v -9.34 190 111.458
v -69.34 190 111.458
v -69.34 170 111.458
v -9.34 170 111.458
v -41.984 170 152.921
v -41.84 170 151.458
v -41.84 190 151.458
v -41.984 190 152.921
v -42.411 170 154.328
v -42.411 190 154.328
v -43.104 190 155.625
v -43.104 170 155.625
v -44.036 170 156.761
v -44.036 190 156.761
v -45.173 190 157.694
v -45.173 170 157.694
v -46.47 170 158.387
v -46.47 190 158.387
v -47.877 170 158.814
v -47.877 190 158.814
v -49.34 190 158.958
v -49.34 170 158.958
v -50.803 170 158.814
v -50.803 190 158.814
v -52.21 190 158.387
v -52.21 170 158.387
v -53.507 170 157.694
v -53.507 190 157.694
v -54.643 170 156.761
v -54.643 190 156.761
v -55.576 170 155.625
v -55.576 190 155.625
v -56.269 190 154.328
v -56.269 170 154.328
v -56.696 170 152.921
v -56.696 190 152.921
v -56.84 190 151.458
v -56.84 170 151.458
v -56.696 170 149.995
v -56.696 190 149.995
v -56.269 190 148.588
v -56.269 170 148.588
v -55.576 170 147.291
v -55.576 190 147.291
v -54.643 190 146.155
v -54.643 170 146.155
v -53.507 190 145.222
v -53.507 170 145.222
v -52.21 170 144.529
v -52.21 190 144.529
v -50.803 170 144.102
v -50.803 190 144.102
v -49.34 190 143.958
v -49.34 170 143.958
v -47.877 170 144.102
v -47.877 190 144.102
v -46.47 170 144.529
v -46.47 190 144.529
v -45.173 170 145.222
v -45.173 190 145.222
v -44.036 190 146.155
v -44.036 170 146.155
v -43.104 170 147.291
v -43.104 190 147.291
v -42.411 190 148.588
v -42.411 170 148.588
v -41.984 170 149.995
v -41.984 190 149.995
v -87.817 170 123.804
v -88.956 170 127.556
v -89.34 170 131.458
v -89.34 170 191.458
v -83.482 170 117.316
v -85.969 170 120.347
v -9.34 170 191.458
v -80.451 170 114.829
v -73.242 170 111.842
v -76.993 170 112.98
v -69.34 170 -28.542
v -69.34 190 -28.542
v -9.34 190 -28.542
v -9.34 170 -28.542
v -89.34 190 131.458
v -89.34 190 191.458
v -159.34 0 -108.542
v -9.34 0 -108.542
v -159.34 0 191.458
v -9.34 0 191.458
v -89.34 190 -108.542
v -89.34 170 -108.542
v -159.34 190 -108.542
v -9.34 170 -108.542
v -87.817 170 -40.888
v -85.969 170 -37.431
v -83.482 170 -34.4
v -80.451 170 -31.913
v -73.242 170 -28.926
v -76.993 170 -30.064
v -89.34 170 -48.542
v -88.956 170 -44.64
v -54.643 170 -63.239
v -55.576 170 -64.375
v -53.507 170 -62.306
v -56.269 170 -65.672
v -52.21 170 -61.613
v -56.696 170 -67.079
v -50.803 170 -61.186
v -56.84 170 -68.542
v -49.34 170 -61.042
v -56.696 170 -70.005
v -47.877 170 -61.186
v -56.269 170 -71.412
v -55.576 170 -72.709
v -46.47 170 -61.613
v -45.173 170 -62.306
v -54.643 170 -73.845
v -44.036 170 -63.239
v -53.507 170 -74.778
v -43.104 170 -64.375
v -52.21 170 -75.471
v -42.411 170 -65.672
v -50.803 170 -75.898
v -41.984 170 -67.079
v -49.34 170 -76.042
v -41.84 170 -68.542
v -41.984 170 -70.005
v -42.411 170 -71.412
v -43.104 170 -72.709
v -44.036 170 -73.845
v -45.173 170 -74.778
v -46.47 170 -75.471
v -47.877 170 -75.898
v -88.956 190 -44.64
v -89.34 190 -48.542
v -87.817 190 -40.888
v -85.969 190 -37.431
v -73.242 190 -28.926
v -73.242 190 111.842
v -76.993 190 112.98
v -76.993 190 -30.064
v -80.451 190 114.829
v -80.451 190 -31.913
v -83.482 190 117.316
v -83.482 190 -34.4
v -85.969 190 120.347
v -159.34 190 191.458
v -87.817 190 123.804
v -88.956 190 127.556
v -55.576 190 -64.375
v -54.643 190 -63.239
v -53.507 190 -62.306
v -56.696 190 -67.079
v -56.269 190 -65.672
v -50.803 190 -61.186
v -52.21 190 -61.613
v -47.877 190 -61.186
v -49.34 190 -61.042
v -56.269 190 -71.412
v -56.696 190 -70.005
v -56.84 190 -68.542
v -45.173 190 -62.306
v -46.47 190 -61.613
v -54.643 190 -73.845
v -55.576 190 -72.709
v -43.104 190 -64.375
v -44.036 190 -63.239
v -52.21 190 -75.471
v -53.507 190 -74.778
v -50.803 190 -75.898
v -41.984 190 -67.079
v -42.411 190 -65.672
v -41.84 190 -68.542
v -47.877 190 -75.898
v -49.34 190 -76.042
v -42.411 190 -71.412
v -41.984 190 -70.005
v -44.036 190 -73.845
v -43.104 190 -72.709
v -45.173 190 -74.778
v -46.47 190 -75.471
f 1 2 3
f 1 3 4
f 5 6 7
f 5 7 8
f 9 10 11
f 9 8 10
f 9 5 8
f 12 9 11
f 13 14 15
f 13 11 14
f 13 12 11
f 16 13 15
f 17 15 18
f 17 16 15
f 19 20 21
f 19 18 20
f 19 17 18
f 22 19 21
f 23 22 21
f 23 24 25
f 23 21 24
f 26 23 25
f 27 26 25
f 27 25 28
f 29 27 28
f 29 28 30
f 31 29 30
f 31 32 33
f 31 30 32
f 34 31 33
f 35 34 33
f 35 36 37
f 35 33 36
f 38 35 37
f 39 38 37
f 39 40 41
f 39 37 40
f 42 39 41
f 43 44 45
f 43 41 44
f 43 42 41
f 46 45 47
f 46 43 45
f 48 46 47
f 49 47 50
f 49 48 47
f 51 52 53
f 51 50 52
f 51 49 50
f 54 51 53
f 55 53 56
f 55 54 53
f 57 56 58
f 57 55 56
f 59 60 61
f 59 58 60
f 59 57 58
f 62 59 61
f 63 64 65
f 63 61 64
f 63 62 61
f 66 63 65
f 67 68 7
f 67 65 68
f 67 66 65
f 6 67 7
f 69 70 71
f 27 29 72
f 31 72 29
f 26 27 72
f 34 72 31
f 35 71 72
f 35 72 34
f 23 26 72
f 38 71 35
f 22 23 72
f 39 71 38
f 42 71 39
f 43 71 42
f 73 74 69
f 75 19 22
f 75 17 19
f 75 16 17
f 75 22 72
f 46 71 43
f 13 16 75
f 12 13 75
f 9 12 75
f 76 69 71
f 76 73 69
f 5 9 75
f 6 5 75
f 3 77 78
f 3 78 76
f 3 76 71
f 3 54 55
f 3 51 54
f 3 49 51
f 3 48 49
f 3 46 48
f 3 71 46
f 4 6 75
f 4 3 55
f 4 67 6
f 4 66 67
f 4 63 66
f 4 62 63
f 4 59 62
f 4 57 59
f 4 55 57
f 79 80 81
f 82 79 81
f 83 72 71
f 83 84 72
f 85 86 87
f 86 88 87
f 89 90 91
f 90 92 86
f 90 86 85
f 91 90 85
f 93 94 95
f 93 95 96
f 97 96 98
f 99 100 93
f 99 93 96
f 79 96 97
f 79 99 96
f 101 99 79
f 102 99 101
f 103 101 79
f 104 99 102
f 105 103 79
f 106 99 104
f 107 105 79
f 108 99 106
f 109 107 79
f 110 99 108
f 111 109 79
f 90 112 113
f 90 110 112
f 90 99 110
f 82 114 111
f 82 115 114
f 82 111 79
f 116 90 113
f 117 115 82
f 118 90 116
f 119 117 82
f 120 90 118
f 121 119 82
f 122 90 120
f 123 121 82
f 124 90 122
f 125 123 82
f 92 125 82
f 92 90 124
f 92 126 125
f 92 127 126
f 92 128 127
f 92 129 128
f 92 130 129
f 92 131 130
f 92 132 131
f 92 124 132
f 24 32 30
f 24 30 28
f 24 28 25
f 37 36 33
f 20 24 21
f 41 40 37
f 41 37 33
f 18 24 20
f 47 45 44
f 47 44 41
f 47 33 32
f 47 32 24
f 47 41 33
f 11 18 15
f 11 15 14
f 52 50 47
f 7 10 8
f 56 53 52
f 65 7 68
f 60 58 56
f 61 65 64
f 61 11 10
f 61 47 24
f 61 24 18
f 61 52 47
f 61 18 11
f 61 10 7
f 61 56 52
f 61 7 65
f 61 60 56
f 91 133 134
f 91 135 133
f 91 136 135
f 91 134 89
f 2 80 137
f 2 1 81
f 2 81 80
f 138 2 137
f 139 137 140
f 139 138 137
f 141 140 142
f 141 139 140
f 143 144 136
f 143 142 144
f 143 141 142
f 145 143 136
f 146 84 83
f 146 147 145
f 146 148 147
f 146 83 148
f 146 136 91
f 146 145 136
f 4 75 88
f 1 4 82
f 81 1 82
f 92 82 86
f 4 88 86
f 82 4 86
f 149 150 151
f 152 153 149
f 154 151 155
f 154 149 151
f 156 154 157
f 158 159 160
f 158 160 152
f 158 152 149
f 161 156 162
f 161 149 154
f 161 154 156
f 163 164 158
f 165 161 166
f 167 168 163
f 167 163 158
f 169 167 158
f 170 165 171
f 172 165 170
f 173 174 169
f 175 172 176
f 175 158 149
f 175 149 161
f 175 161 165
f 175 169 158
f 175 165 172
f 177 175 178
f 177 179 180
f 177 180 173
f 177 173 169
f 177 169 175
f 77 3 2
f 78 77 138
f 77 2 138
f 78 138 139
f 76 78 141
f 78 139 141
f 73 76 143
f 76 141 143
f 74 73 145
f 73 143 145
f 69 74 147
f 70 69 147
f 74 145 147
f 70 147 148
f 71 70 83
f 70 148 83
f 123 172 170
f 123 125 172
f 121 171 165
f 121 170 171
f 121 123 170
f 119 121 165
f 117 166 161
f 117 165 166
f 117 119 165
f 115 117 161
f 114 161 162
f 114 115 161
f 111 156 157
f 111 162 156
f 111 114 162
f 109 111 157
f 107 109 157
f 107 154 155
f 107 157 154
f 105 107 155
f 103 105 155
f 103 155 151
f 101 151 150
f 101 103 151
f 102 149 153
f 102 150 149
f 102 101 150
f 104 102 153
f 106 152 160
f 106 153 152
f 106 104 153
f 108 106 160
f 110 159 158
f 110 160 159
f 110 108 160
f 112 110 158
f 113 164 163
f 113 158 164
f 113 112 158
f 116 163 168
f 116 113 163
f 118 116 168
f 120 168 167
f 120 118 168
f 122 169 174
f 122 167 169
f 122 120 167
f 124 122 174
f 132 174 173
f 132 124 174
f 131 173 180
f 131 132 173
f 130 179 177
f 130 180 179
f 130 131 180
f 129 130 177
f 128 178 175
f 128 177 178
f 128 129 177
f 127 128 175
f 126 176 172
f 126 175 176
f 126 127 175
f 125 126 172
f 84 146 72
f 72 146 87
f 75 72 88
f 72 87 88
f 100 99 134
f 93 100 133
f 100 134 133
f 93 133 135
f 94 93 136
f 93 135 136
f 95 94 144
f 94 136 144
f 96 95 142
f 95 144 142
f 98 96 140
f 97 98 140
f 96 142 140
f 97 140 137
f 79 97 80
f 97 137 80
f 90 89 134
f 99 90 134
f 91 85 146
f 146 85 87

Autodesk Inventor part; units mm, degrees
ref_plane "YZ Plane" through (0, 0, 0) normal (1, 0, 0) x (0, 1, 0)
ref_plane "XZ Plane" through (0, 0, 0) normal (0, 1, 0) x (-1, 0, 0)
ref_plane "XY Plane" through (0, 0, 0) normal (0, 0, 1) x (1, 0, 0)
sketch "Skizze1" plane through (0, 0, 0) normal (0, 1, 0) x (-1, 0, 0)
  line L0 (159.3398, 191.458) -> (9.3398, 191.458)
  line L1 (9.3398, 191.458) -> (9.3398, -108.542)
  line L2 (9.3398, -108.542) -> (159.3398, -108.542)
  line L3 (159.3398, -108.542) -> (159.3398, 191.458)
  point P0 (0, 0)
  dimension "d0" = 300
  dimension "d1" = 150
extrude "Extrusion1" add sketch "Skizze1" along normal blind 190
sketch "Skizze2" plane through (0, 190, 0) normal (0, 1, 0) x (1, 0, 0)
  line L0 (-9.3398, 108.542) -> (-159.3398, 108.542) projected
  line L1 (-159.3398, -191.458) -> (-9.3398, -191.458) projected
  line L2 (-9.3398, -191.458) -> (-9.3398, 108.542) projected
  line L3 (-9.3398, 108.542) -> (-159.3398, 108.542) projected
  line L4 (-159.3398, 108.542) -> (-159.3398, -191.458) projected
  line L5 (-9.3398, 108.542) -> (-89.3398, 108.542)
  line L6 (-89.3398, 108.542) -> (-89.3398, 48.542)
  line L7 (-69.3398, 28.542) -> (-9.3398, 28.542)
  line L8 (-9.3398, 28.542) -> (-9.3398, 108.542)
  line L9 (-9.3398, -191.458) -> (-9.3398, 108.542) projected
  line L10 (-9.3398, -191.458) -> (-89.3398, -191.458)
  line L11 (-89.3398, -191.458) -> (-89.3398, -131.458)
  line L12 (-69.3398, -111.458) -> (-9.3398, -111.458)
  line L13 (-9.3398, -111.458) -> (-9.3398, -191.458)
  arc A0 (-69.3398, -111.458) -> (-89.3398, -131.458) centre (-69.3398, -131.458) ccw
  arc A1 (-89.3398, 48.542) -> (-69.3398, 28.542) centre (-69.3398, 48.542) ccw
  point P0 (0, 0)
  point P1 (-89.3398, 28.542)
  point P2 (-89.3398, -111.458)
  dimension "d4" = 80
  dimension "d5" = 80
  dimension "d6" = 80
  dimension "d7" = 80
  dimension "d8" = 20
  dimension "d9" = 20
extrude "Extrusion2" cut sketch "Skizze2" against normal blind 20 contours L2 L7 A1 L6 L0 | L2 L1 L11 A0 L12
sketch "Skizze3" plane through (0, 170, 0) normal (0, 1, 0) x (1, 0, 0)
  line L0 (-9.3398, -111.458) -> (-9.3398, -191.458) projected
  line L1 (-69.3398, -111.458) -> (-9.3398, -111.458) projected
  arc A0 (-69.3398, -111.458) -> (-89.3398, -131.458) centre (-69.3398, -131.458) ccw projected
  line L2 (-89.3398, -191.458) -> (-89.3398, -131.458) projected
  line L3 (-9.3398, -191.458) -> (-89.3398, -191.458) projected
  line L4 (-9.3398, 108.542) -> (-9.3398, 28.542) projected
  line L5 (-89.3398, 108.542) -> (-9.3398, 108.542) projected
  line L6 (-89.3398, 48.542) -> (-89.3398, 108.542) projected
  arc A1 (-89.3398, 48.542) -> (-69.3398, 28.542) centre (-69.3398, 48.542) ccw projected
  line L7 (-9.3398, 28.542) -> (-69.3398, 28.542) projected
  circle A2 centre (-49.3398, -151.458) radius 7.5
  circle A3 centre (-49.3398, 68.542) radius 7.5
  point P0 (0, 0)
  dimension "d12" = 15
  dimension "d13" = 15
  dimension "d16" = 40
  dimension "d17" = 40
  dimension "d18" = 40
  dimension "d19" = 40
extrude "Extrusion3" add sketch "Skizze3" along normal blind 20 contours A2 | A3
properties part number "Baterie"
